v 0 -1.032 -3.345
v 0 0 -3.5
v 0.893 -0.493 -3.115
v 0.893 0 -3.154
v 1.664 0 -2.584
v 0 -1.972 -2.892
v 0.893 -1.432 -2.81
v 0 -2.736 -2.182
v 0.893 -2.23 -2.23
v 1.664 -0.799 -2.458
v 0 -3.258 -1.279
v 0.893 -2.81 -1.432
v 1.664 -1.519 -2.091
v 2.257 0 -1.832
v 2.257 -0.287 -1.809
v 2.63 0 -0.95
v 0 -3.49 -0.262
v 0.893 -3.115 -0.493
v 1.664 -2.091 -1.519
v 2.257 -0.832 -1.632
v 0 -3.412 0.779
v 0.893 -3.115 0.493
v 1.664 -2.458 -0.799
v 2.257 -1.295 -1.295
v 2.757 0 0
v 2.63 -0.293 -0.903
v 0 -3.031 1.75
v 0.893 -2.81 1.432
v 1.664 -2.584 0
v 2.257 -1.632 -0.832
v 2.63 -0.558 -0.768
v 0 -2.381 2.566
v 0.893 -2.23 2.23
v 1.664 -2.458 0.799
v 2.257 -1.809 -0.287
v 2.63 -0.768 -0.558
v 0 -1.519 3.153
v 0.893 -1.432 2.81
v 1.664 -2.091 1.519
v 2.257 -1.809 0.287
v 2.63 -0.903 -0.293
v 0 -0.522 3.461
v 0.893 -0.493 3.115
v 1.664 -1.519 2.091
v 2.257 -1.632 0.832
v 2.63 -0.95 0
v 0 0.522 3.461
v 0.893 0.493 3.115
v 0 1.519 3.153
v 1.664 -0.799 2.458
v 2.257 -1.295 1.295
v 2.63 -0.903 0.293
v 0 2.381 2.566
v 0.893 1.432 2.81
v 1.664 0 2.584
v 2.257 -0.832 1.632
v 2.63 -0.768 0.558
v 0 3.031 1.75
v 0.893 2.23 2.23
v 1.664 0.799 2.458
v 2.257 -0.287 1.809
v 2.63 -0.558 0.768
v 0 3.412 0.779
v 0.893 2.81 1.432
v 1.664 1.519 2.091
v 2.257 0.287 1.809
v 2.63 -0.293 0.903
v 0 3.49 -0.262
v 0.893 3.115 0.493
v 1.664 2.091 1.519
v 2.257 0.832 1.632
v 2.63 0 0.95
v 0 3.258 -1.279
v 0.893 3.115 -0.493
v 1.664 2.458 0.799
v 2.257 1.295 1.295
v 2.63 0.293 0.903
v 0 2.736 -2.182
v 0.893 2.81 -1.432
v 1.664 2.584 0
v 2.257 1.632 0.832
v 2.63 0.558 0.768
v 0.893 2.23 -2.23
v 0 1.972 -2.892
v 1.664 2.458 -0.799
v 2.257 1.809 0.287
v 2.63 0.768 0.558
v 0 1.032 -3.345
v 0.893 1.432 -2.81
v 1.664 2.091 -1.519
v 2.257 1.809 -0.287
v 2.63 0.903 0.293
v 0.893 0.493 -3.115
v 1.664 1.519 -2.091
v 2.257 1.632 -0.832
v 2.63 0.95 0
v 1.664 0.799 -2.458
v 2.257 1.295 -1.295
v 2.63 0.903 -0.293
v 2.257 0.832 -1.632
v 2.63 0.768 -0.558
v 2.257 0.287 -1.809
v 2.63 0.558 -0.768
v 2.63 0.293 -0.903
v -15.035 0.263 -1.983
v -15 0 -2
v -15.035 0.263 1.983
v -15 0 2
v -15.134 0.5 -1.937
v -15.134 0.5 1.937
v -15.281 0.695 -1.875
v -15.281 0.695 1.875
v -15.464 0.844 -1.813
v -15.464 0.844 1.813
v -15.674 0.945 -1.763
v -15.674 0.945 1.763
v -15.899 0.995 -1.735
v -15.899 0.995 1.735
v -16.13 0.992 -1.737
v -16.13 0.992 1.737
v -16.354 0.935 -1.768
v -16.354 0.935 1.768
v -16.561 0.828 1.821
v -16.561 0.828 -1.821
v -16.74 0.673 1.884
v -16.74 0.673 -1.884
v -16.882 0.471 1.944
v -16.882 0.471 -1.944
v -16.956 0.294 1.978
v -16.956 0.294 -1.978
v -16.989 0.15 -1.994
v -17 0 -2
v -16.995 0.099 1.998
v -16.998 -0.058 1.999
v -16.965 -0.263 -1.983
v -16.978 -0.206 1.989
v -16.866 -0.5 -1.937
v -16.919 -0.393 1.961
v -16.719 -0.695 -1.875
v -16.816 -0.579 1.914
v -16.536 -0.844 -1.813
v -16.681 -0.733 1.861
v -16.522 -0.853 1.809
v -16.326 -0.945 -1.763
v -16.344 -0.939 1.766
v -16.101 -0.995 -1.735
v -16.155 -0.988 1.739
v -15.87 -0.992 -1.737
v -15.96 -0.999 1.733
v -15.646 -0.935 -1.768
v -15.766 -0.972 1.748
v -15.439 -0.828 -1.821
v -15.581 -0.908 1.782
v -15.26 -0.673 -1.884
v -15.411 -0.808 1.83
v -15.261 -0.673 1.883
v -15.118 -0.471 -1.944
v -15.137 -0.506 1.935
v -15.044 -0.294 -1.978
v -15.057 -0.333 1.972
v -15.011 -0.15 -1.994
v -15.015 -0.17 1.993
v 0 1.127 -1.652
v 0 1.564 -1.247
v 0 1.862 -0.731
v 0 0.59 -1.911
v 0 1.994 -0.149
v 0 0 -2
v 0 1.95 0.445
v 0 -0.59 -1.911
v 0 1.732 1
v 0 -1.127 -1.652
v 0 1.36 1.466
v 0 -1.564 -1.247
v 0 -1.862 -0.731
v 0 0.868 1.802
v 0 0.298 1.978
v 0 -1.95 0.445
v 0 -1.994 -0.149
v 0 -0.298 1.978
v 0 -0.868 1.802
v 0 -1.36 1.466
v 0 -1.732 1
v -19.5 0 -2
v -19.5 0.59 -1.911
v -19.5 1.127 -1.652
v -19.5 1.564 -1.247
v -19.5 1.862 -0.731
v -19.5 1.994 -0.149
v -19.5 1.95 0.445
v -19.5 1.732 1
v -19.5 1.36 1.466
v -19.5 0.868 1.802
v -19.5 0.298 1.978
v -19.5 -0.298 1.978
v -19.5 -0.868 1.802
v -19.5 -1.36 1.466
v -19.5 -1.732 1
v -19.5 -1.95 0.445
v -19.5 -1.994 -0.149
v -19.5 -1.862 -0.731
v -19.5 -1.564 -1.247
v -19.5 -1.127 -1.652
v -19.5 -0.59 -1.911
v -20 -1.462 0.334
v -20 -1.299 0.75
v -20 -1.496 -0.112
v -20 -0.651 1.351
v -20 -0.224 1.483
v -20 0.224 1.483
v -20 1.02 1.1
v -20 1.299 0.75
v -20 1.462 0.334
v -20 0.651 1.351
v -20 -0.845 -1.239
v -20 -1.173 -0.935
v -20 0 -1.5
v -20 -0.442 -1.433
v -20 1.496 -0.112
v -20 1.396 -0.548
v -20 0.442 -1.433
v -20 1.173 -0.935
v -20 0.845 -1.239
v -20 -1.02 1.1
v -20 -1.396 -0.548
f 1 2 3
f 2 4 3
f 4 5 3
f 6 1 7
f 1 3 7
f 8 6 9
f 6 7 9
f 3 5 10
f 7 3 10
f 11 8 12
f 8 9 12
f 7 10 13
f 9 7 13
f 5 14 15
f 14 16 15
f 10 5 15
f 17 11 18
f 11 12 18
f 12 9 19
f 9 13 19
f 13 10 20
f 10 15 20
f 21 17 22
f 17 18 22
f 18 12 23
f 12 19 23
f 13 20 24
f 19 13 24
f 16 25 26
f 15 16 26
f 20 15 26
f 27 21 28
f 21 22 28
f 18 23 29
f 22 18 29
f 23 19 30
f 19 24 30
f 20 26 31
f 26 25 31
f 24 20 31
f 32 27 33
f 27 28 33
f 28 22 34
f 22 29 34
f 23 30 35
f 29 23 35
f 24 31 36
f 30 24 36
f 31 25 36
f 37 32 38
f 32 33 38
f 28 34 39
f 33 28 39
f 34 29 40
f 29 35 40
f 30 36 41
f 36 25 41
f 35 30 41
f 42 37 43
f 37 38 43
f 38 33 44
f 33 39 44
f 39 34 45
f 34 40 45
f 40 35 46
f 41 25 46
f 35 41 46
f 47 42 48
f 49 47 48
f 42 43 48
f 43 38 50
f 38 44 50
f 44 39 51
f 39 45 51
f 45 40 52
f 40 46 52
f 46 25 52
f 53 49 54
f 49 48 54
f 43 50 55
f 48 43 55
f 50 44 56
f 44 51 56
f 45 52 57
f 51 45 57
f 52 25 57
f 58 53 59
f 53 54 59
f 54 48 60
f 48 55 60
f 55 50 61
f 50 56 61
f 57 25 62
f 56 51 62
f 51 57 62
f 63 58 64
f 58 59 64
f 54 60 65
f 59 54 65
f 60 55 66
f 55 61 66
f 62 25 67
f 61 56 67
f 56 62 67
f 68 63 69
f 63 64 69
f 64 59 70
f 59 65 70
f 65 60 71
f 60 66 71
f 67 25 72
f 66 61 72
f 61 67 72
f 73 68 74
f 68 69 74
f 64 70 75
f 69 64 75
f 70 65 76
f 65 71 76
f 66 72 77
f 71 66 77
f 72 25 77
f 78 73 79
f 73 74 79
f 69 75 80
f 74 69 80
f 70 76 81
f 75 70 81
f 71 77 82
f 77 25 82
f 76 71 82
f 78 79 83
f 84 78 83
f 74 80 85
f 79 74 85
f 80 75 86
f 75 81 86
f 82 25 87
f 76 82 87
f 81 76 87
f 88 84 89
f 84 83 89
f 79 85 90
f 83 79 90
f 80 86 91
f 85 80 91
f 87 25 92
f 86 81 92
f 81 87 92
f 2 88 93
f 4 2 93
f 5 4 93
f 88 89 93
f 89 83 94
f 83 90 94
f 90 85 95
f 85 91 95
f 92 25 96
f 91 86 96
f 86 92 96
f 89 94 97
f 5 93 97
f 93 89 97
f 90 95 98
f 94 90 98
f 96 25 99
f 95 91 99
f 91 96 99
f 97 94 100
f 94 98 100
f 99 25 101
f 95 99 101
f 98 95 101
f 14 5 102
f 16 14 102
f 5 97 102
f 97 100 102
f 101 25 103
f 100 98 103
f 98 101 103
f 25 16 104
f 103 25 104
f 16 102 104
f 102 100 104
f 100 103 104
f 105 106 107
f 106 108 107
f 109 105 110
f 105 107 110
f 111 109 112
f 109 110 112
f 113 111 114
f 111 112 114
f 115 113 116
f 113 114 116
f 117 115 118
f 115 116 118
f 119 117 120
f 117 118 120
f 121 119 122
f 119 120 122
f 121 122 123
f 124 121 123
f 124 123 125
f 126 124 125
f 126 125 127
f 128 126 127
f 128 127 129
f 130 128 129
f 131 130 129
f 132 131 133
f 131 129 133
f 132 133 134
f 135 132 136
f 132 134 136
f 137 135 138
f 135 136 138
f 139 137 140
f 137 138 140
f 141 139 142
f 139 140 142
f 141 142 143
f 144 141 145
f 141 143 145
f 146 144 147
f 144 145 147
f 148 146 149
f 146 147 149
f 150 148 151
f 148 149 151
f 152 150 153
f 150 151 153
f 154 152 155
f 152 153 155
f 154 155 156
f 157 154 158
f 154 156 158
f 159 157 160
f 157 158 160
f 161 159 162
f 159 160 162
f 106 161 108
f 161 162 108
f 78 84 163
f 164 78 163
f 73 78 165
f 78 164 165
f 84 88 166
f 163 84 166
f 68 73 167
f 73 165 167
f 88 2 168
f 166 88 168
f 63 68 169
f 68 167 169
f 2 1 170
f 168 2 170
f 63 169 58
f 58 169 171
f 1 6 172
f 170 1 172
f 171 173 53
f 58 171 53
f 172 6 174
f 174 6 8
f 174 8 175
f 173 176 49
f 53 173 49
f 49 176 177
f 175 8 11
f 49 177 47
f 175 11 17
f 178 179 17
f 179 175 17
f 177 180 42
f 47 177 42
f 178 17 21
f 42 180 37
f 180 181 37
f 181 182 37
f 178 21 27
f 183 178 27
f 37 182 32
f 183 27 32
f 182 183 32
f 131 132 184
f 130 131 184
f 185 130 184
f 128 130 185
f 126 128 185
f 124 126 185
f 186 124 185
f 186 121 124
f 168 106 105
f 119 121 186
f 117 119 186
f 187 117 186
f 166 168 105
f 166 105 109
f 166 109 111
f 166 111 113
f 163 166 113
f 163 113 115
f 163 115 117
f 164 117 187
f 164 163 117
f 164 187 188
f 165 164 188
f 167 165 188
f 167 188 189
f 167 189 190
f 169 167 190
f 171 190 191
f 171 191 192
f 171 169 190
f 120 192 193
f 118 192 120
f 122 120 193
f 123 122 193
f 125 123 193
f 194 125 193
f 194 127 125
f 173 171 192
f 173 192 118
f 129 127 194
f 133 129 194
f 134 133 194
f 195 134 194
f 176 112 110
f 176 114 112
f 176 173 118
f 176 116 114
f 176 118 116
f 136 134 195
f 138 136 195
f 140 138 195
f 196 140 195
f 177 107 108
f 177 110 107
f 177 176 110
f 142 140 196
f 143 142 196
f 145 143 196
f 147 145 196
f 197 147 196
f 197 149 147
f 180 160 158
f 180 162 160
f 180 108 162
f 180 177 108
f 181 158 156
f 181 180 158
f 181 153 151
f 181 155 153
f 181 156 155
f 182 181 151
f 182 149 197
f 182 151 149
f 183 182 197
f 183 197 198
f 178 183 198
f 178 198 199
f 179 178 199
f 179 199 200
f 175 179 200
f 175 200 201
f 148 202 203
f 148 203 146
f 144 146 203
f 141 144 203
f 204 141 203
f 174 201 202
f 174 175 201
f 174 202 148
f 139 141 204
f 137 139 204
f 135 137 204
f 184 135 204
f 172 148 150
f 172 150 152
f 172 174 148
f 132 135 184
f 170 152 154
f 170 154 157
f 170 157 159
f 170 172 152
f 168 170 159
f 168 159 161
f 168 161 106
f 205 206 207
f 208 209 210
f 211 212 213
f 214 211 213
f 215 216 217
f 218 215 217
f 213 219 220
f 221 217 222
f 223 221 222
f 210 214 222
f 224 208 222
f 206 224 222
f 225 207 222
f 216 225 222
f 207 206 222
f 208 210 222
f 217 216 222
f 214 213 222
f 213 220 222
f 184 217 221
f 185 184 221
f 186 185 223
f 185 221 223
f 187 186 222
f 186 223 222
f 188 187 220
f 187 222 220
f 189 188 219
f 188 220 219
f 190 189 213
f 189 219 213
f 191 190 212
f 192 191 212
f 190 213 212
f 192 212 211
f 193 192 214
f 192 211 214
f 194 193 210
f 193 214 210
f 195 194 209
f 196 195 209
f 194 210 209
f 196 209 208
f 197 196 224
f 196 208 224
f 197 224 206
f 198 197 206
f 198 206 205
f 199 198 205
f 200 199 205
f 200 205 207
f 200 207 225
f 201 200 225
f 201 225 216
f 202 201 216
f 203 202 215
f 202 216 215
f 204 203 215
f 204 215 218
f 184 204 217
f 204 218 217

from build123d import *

# Parameters (mm, degrees)
SKETCH1_R               = 2
BOSS_EXTRUDE1_DEPTH     = 20
SKETCH2_R               = 1
CUT_EXTRUDE1_DEPTH      = 3
CUT_EXTRUDE1_DEPTH_BACK = 3
CHAMFER1_SIZE           = 0.5


with BuildPart() as part:
    # Sketch1 → Boss-Extrude1 (new body)
    with BuildSketch(Plane(origin=(0, 0, 0), x_dir=(0, 0, -1), z_dir=(1, 0, 0))):
        Circle(SKETCH1_R)
    extrude(amount=-BOSS_EXTRUDE1_DEPTH)

    # Sketch2 → Cut-Extrude1 (cut, two sides)
    with BuildSketch(Plane.XY) as cut_extrude1_sk:
        with Locations((-16, 0)):
            Circle(SKETCH2_R)
    extrude(amount=CUT_EXTRUDE1_DEPTH, mode=Mode.SUBTRACT)
    extrude(cut_extrude1_sk.sketch, amount=-CUT_EXTRUDE1_DEPTH_BACK, mode=Mode.SUBTRACT)

    # Chamfer1
    chamfer1_edges = [part.edges().sort_by_distance(p)[0] for p in [
        (-20, 0, 2),
    ]]
    chamfer(chamfer1_edges, length=CHAMFER1_SIZE)

    # Sketch3 → Revolve1 (revolve)
    with BuildSketch(Plane(origin=(0, 0, 0), x_dir=(1, 0, 0), z_dir=(0, 1, 0))):
        with BuildLine():
            Line((2.757385023, 0), (0, 0))
            Line((0, 0), (0, 3.5))
            ThreePointArc((0, 3.5), (1.985229955, 2.227844932), (2.757385023, 0))
        make_face()
    revolve(axis=Axis((3.35333719, 0, 0), (-1, 0, 0)))


solid = part.part
